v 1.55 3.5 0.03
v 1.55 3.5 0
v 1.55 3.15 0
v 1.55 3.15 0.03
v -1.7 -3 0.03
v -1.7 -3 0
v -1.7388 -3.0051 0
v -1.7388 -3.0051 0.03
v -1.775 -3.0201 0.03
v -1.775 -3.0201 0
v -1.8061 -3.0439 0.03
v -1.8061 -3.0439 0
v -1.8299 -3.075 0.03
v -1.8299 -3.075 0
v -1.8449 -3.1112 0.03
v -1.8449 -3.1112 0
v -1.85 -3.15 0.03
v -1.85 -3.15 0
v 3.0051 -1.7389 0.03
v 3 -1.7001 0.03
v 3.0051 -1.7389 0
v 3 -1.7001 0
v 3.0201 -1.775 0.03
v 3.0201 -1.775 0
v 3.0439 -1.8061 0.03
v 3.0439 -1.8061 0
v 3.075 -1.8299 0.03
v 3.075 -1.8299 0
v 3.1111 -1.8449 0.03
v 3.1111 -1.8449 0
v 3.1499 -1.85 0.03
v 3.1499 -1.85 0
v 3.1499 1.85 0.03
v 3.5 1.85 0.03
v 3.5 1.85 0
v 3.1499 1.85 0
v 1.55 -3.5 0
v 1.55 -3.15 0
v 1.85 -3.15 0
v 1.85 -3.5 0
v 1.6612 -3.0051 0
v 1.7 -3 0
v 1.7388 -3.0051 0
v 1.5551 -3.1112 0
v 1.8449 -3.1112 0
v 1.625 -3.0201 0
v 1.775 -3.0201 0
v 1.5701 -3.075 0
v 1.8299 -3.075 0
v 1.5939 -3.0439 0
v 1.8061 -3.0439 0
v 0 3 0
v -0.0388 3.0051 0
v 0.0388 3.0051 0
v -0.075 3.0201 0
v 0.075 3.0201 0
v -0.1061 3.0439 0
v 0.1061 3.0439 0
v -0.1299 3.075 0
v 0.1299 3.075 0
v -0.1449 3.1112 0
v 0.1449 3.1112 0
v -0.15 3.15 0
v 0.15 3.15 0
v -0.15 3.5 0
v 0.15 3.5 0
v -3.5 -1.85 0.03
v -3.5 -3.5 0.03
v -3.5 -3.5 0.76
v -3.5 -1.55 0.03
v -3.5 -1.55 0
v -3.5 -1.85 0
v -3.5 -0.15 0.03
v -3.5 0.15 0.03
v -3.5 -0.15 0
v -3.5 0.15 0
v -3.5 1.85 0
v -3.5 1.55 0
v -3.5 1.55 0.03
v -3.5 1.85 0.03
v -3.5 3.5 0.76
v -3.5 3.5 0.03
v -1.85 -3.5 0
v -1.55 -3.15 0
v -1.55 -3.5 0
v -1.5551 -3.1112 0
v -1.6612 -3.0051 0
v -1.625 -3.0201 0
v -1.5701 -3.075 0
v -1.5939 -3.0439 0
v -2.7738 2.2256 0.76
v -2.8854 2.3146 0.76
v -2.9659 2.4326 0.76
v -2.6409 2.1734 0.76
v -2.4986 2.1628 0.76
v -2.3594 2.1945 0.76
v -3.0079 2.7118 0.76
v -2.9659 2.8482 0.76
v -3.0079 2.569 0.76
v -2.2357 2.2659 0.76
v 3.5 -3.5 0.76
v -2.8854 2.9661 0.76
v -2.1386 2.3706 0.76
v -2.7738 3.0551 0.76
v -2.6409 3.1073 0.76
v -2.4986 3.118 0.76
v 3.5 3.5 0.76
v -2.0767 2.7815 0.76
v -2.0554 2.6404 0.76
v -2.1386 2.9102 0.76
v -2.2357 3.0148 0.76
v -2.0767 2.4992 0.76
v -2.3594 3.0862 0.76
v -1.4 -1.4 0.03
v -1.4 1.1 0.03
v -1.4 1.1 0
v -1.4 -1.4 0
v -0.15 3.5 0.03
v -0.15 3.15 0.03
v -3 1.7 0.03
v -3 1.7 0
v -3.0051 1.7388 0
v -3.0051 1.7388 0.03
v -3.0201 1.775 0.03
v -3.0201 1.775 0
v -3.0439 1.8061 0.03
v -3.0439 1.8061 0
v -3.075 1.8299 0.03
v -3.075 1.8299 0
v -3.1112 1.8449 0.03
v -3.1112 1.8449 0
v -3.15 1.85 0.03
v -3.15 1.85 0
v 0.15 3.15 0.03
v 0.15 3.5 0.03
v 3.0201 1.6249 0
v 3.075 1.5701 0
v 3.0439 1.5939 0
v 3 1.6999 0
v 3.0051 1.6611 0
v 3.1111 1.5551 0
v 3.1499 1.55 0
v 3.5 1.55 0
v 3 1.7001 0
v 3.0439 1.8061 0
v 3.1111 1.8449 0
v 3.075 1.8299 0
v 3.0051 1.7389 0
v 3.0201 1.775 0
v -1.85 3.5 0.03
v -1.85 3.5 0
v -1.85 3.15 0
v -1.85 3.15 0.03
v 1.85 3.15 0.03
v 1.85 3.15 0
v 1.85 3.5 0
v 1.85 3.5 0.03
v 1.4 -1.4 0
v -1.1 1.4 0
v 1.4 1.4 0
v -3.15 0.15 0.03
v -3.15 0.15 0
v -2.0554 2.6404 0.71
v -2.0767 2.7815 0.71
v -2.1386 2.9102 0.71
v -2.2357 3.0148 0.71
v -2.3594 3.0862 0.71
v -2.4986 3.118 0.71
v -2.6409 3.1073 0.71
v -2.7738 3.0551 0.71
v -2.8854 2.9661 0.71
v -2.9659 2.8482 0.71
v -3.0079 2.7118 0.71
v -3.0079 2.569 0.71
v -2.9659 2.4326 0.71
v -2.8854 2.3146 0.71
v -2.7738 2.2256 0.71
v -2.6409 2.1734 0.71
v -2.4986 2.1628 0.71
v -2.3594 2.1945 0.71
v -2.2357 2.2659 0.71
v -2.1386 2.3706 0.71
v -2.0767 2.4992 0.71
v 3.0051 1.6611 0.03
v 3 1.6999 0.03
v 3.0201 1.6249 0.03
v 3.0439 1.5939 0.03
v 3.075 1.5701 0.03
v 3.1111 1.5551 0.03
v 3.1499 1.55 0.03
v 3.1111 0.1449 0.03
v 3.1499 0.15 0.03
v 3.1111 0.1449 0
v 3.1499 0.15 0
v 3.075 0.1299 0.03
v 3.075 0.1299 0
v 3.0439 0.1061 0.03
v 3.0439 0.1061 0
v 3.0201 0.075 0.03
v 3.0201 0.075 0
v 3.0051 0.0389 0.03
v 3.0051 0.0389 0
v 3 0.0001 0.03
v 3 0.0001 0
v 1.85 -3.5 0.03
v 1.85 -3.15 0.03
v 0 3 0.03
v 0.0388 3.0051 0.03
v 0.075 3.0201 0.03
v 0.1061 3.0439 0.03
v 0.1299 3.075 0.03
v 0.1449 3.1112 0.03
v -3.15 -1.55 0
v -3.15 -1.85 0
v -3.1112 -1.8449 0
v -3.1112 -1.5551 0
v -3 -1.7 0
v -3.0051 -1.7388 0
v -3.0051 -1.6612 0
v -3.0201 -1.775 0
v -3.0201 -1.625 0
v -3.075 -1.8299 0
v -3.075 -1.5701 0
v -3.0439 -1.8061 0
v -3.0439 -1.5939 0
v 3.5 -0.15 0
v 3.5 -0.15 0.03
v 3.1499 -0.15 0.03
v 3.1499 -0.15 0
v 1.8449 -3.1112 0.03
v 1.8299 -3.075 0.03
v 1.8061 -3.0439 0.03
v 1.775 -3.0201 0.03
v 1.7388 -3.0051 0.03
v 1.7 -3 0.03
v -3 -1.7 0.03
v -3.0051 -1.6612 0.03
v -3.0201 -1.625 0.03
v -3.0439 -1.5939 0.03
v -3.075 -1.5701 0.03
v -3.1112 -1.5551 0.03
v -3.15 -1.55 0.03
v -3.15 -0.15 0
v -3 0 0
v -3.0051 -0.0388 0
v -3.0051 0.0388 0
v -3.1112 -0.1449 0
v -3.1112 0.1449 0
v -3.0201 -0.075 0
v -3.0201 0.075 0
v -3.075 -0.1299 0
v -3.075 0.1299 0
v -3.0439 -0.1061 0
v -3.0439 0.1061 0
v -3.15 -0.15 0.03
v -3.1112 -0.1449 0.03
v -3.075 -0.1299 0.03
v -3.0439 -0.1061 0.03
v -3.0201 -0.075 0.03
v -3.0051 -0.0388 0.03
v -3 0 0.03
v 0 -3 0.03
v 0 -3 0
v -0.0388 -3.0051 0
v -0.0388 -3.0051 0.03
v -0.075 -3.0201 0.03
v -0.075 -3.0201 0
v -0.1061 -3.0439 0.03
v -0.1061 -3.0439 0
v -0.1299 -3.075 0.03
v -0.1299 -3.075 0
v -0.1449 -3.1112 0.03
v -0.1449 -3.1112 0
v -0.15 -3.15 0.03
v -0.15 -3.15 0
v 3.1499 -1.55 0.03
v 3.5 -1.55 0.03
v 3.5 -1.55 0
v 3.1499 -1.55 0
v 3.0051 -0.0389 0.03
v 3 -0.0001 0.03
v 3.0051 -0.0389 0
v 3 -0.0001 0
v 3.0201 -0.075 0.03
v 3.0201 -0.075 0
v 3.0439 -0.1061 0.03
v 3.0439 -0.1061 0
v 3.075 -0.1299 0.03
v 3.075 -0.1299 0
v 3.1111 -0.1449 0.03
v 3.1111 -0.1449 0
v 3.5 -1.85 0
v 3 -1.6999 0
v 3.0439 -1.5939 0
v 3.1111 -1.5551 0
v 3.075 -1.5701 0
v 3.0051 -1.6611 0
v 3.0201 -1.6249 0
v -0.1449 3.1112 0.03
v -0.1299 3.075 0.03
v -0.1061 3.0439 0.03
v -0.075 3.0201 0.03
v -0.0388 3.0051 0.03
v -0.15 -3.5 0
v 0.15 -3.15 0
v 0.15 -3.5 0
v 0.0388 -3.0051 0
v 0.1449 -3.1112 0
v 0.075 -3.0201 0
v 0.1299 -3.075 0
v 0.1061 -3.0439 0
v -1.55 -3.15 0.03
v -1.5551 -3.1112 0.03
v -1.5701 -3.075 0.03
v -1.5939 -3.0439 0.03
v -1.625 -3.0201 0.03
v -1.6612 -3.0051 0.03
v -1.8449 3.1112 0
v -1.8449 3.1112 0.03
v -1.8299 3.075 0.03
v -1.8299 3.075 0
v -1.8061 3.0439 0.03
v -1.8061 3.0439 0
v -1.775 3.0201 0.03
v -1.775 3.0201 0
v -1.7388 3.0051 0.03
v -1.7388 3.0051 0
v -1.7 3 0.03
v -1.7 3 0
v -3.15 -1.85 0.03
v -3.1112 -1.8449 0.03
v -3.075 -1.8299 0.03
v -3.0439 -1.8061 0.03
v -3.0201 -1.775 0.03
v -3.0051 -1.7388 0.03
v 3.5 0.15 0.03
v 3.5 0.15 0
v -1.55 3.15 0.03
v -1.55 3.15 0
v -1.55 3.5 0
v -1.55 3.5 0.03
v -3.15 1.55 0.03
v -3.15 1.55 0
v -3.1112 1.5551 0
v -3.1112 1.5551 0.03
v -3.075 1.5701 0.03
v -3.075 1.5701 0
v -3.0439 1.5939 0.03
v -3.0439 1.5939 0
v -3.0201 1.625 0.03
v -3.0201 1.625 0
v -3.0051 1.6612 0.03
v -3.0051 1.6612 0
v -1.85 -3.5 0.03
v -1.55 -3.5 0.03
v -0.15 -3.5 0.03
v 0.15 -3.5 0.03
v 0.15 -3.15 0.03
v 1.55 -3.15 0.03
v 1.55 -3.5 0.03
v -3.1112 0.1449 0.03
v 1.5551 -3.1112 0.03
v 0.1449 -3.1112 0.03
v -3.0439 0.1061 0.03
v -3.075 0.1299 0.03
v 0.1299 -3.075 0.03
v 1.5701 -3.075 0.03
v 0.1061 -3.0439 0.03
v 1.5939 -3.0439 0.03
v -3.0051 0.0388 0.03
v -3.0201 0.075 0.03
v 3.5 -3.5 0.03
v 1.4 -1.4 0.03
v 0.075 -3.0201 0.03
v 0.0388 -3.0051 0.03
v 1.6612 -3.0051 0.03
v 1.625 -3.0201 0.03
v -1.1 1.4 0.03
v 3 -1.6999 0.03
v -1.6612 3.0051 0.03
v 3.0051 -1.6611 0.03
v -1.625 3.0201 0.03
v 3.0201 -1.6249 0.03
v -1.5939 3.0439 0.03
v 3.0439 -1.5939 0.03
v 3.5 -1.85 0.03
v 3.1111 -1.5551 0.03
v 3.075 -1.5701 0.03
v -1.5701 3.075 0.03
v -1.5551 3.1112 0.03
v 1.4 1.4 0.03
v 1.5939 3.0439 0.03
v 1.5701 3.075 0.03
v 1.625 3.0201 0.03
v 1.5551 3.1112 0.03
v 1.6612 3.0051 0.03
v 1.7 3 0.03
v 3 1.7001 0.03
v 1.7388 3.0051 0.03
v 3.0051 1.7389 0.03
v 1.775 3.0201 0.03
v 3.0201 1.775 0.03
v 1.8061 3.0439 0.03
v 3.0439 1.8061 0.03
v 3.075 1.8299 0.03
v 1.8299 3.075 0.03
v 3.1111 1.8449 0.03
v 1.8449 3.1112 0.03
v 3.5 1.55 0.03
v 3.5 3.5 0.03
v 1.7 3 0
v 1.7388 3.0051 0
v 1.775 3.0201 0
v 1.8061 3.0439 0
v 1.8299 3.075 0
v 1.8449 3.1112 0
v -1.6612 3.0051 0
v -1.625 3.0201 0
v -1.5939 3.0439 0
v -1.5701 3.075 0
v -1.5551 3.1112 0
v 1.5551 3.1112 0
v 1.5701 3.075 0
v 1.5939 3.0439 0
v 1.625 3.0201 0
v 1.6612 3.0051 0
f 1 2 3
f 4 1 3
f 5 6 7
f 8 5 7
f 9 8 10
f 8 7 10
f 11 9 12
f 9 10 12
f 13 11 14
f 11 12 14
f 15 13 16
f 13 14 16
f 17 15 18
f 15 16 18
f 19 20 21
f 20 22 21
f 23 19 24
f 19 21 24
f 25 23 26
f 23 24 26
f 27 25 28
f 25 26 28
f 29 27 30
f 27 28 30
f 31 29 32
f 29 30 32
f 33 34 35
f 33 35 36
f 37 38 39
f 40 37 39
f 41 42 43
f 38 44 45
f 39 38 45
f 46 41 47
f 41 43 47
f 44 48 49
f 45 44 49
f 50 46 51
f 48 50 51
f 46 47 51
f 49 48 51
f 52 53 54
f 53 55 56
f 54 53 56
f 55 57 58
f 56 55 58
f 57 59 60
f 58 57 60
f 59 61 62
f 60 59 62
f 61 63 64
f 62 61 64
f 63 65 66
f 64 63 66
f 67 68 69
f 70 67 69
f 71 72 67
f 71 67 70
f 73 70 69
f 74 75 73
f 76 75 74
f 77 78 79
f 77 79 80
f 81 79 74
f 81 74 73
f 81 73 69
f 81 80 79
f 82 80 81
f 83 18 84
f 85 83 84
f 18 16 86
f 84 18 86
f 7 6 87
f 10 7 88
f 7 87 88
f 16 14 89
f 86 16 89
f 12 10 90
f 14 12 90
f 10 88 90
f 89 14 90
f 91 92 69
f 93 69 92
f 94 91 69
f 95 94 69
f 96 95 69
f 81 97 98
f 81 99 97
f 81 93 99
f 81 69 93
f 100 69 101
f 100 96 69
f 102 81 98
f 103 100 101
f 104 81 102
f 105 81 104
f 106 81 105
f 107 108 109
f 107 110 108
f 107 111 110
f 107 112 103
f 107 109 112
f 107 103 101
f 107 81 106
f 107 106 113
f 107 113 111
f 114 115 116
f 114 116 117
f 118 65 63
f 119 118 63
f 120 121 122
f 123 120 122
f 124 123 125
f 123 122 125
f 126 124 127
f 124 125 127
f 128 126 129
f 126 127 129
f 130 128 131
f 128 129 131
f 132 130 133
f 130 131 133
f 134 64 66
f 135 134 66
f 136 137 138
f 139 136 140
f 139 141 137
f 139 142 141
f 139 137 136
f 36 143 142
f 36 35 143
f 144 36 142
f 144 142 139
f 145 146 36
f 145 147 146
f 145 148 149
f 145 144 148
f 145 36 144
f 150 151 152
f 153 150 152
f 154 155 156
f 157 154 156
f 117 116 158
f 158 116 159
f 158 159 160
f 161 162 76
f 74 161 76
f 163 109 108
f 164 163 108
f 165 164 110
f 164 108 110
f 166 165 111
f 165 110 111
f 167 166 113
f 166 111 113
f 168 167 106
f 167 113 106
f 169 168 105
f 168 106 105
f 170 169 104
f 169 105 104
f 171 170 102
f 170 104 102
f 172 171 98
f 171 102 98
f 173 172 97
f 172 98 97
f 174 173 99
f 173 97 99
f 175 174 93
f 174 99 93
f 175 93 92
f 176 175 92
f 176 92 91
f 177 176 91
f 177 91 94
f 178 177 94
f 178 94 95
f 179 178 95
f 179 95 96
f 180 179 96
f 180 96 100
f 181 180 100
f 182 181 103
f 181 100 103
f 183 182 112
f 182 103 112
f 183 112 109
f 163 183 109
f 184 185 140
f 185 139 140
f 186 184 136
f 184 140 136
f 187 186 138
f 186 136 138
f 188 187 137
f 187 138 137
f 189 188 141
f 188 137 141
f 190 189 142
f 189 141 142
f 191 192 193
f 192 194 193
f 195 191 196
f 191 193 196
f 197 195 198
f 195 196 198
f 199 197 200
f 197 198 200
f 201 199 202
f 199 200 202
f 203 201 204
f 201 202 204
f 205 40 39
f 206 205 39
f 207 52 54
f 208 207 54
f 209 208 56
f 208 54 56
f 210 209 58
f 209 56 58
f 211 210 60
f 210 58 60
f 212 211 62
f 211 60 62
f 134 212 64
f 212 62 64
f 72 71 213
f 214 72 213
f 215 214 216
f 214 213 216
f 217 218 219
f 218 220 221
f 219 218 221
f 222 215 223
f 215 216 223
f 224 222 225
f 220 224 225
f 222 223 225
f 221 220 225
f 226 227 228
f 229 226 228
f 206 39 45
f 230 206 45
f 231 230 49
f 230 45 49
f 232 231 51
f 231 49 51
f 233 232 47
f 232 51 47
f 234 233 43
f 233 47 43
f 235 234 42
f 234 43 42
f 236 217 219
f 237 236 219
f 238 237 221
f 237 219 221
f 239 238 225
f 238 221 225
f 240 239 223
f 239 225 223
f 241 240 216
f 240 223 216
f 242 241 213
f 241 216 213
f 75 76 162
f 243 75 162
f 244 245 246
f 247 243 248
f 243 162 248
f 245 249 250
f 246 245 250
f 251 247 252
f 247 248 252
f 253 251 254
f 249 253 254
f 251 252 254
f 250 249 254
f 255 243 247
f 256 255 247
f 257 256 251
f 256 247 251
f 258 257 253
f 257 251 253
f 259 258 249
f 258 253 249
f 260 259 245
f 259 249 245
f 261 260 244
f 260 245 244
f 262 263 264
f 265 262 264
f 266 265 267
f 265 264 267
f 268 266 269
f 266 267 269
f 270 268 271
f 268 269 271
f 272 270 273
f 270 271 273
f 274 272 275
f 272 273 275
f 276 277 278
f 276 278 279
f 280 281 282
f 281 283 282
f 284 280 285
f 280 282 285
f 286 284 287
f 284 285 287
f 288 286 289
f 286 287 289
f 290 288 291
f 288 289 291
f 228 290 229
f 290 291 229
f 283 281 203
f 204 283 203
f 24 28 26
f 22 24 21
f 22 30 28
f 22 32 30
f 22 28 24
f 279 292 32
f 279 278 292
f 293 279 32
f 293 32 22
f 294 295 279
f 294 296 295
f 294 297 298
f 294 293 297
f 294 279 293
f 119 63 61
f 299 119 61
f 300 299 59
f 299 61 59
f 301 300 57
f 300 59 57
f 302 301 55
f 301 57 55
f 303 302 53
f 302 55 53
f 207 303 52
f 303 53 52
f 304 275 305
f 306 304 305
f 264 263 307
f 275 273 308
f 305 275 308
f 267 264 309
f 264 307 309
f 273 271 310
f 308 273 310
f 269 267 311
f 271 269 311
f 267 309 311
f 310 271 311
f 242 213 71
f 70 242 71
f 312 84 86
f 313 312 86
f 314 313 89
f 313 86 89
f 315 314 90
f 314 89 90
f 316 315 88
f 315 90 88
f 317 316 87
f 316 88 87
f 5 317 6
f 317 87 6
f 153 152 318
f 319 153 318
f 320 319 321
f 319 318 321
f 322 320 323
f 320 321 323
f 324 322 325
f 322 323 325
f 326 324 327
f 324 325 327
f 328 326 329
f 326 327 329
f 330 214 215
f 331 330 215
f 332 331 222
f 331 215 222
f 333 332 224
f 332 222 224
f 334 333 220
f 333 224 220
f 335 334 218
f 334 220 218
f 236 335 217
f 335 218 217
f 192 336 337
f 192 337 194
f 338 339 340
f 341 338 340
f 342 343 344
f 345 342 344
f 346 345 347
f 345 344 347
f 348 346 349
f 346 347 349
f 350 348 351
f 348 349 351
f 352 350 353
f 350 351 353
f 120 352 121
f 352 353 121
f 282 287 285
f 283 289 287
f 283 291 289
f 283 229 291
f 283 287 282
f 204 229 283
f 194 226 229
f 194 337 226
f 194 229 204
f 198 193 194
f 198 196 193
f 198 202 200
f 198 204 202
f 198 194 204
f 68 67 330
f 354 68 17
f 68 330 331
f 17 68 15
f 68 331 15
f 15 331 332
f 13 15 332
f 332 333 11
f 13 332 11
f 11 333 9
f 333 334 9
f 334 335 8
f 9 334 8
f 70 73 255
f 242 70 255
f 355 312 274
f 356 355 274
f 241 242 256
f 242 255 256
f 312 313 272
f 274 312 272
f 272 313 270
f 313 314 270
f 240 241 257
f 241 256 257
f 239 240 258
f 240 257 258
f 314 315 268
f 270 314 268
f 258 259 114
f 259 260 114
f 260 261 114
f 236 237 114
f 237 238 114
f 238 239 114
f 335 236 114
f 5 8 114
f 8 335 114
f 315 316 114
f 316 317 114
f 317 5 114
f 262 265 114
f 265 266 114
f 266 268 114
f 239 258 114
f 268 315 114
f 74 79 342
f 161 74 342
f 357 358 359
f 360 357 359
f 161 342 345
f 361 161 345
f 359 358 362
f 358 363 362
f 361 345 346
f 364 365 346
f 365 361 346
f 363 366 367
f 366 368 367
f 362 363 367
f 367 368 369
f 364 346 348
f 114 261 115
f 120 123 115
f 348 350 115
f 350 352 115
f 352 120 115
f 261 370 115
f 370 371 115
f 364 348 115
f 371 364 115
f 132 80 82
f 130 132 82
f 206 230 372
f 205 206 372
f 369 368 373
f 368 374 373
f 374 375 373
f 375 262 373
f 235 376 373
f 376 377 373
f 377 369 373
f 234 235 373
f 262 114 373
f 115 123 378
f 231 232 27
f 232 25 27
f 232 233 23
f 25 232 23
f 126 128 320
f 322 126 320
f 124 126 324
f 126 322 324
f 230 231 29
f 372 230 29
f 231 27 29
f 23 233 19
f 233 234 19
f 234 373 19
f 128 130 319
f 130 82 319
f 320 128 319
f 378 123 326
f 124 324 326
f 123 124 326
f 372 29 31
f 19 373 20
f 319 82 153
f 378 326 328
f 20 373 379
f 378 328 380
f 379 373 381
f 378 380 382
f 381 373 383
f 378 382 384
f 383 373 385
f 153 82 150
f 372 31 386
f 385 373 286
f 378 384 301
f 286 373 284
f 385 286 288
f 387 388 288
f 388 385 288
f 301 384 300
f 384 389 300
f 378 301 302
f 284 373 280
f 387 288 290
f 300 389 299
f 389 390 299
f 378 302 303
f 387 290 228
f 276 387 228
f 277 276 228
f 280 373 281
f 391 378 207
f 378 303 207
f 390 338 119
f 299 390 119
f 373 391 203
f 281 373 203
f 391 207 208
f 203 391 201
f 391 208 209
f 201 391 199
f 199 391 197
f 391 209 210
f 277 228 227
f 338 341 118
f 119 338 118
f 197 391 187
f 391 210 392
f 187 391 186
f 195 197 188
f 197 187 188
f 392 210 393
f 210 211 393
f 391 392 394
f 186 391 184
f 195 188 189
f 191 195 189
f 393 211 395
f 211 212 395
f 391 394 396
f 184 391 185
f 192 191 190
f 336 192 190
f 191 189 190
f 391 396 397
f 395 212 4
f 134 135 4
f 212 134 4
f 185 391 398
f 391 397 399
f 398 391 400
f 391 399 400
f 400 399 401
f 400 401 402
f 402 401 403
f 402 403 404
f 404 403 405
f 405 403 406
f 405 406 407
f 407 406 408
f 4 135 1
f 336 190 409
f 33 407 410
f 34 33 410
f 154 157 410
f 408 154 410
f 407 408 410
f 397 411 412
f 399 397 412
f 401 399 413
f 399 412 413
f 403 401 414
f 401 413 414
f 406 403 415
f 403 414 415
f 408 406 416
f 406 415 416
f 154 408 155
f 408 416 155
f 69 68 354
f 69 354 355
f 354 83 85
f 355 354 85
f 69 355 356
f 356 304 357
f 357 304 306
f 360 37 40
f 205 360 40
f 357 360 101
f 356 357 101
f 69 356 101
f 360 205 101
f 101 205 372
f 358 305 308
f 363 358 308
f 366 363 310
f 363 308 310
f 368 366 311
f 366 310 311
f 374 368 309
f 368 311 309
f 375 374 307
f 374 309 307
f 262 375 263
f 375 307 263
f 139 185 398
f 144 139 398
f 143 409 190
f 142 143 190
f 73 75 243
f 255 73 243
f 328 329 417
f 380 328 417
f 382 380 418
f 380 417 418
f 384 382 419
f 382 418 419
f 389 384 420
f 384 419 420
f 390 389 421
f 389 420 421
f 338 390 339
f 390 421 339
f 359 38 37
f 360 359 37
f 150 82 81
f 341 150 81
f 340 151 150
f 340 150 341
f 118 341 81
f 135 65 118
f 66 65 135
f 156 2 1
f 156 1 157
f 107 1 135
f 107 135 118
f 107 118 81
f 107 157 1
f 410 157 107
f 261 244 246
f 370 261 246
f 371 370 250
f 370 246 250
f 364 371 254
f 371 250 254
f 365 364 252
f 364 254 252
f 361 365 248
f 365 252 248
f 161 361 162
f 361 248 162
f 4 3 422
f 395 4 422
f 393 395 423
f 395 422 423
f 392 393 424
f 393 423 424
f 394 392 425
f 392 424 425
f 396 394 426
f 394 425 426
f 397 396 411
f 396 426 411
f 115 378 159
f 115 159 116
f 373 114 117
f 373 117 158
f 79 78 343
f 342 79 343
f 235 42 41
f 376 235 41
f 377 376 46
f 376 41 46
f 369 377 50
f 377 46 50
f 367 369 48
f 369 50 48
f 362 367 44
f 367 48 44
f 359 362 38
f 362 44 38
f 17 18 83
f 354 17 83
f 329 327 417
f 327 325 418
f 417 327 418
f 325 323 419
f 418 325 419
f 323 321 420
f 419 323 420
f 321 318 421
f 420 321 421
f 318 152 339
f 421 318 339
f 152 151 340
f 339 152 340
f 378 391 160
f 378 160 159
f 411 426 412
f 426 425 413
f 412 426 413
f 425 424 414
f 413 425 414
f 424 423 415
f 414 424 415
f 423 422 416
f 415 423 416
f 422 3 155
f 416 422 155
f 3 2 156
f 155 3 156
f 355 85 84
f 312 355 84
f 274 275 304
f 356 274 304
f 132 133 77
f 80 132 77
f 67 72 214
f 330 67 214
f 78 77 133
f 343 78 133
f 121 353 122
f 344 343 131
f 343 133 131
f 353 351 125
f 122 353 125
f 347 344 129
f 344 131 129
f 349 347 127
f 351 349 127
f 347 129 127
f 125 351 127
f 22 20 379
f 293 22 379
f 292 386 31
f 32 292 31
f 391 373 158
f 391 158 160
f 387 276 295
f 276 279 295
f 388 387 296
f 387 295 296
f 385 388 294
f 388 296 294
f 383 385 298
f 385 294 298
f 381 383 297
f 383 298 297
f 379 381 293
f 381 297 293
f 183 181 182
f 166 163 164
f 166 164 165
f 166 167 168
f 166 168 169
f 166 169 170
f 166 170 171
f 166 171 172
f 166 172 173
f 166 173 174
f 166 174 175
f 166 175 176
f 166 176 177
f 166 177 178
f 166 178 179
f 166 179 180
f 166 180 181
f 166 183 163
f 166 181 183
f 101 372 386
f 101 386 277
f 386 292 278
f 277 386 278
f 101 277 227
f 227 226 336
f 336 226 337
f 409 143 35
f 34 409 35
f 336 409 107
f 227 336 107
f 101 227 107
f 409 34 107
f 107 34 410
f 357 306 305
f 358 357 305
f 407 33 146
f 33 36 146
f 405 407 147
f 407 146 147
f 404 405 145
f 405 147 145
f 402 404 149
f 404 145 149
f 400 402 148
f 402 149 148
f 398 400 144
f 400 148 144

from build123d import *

# Parameters (mm, degrees)
BOSS_EXTRUDE1_START    = 0.03
SKETCH1_W              = 7
SKETCH1_H              = 7
BOSS_EXTRUDE1_DEPTH    = 0.73
SKETCH2_R              = 0.478943658
CUT_EXTRUDE1_DEPTH     = 0.05
BOSS_EXTRUDE2_DEPTH    = 0.03
SKETCH4_W              = 0.5
SKETCH4_H              = 0.3
BOSS_EXTRUDE3_DEPTH    = 0.03
FILLET1_R              = 0.15
LPATTERN1_COUNT        = 3
LPATTERN1_PITCH        = 1.7
FILLET1_OF_LPATTERN1_R = 0.15
CIRPATTERN1_DEPTH      = 0.03


# Read off the part's stored shape, not the designer's step: CirPattern1
with BuildPart() as part:
    # Sketch1 → Boss-Extrude1 (new body)
    with BuildSketch(Plane.XY.offset(BOSS_EXTRUDE1_START)):
        Rectangle(SKETCH1_W, SKETCH1_H)
    extrude(amount=BOSS_EXTRUDE1_DEPTH)

    # Sketch2 → Cut-Extrude1 (cut)
    with BuildSketch(Plane.XY.offset(0.76)):
        with Locations((-2.534351737, 2.640370435)):
            Circle(SKETCH2_R)
    extrude(amount=-CUT_EXTRUDE1_DEPTH, mode=Mode.SUBTRACT)

    # Sketch3 → Boss-Extrude2 (add)
    with BuildSketch(Plane(origin=(0, 0, 0.03), x_dir=(-1, 0, 0), z_dir=(0, 0, -1))):
        Polygon((1.1, 1.4), (1.4, 1.1), (1.4, -1.4), (-1.4, -1.4), (-1.4, 1.4), align=None)
    extrude(amount=BOSS_EXTRUDE2_DEPTH)

    # Sketch4 → Boss-Extrude3 (add)
    with BuildSketch(Plane(origin=(0, 0, 0.03), x_dir=(-1, 0, 0), z_dir=(0, 0, -1))):
        with Locations((-3.25, 1.7)):
            Rectangle(SKETCH4_W, SKETCH4_H)
    boss_extrude3 = extrude(amount=BOSS_EXTRUDE3_DEPTH)

    # Fillet1
    fillet1_edges = [part.edges().sort_by_distance(p)[0] for p in [
        (3, 1.85, 0.015),
        (3, 1.55, 0.015),
    ]]
    fillet(fillet1_edges, radius=FILLET1_R - 0.0001)  # a hair under: the kernel refuses the full size

    # LPattern1: Boss-Extrude3 ×3
    with Locations(*[(0, -i * LPATTERN1_PITCH, 0) for i in range(1, LPATTERN1_COUNT)]):
        add(boss_extrude3)

    # Fillet1 of LPattern1
    fillet1_of_lpattern1_edges = [part.edges().sort_by_distance(p)[0] for p in [
        (3, 0.15, 0.015),
        (3, -0.15, 0.015),
        (3, -1.55, 0.015),
        (3, -1.85, 0.015),
    ]]
    fillet(fillet1_of_lpattern1_edges, radius=FILLET1_OF_LPATTERN1_R - 0.0001)  # a hair under: the kernel refuses the full size

    # CirPattern1 outline → CirPattern1 (add)
    with BuildSketch(Plane.XY):
        with BuildLine():
            Line((-3.5, 1.85), (-3.5, 1.55))
            Line((-3.5, 1.55), (-3.15, 1.55))
            ThreePointArc((-3.15, 1.55), (-3.043933983, 1.593933983), (-3, 1.7))
            ThreePointArc((-3, 1.7), (-3.043933983, 1.806066017), (-3.15, 1.85))
            Line((-3.15, 1.85), (-3.5, 1.85))
        make_face()
        with BuildLine():
            Line((1.55, -3.15), (1.55, -3.5))
            Line((1.55, -3.5), (1.85, -3.5))
            Line((1.85, -3.5), (1.85, -3.15))
            ThreePointArc((1.85, -3.15), (1.806066017, -3.043933983), (1.7, -3))
            ThreePointArc((1.7, -3), (1.593933983, -3.043933983), (1.55, -3.15))
        make_face()
        with BuildLine():
            Line((-0.15, -3.15), (-0.15, -3.5))
            Line((-0.15, -3.5), (0.15, -3.5))
            Line((0.15, -3.5), (0.15, -3.15))
            ThreePointArc((0.15, -3.15), (0.106066017, -3.043933983), (0, -3))
            ThreePointArc((0, -3), (-0.106066017, -3.043933983), (-0.15, -3.15))
        make_face()
        with BuildLine():
            Line((-1.85, -3.15), (-1.85, -3.5))
            Line((-1.85, -3.5), (-1.55, -3.5))
            Line((-1.55, -3.5), (-1.55, -3.15))
            ThreePointArc((-1.55, -3.15), (-1.593933983, -3.043933983), (-1.7, -3))
            ThreePointArc((-1.7, -3), (-1.806066017, -3.043933983), (-1.85, -3.15))
        make_face()
        with BuildLine():
            Line((-3.15, -1.55), (-3.5, -1.55))
            Line((-3.5, -1.55), (-3.5, -1.85))
            Line((-3.5, -1.85), (-3.15, -1.85))
            ThreePointArc((-3.15, -1.85), (-3.043933983, -1.806066017), (-3, -1.7))
            ThreePointArc((-3, -1.7), (-3.043933983, -1.593933983), (-3.15, -1.55))
        make_face()
        with BuildLine():
            Line((-3.15, 0.15), (-3.5, 0.15))
            Line((-3.5, 0.15), (-3.5, -0.15))
            Line((-3.5, -0.15), (-3.15, -0.15))
            ThreePointArc((-3.15, -0.15), (-3.043933983, -0.106066017), (-3, 0))
            ThreePointArc((-3, 0), (-3.043933983, 0.106066017), (-3.15, 0.15))
        make_face()
        with BuildLine():
            Line((1.85, 3.5), (1.55, 3.5))
            Line((1.55, 3.5), (1.55, 3.15))
            ThreePointArc((1.55, 3.15), (1.593933983, 3.043933983), (1.7, 3))
            ThreePointArc((1.7, 3), (1.806066017, 3.043933983), (1.85, 3.15))
            Line((1.85, 3.15), (1.85, 3.5))
        make_face()
        with BuildLine():
            Line((0.15, 3.5), (-0.15, 3.5))
            Line((-0.15, 3.5), (-0.15, 3.15))
            ThreePointArc((-0.15, 3.15), (-0.106066017, 3.043933983), (0, 3))
            ThreePointArc((0, 3), (0.106066017, 3.043933983), (0.15, 3.15))
            Line((0.15, 3.15), (0.15, 3.5))
        make_face()
        with BuildLine():
            Line((-1.55, 3.5), (-1.85, 3.5))
            Line((-1.85, 3.5), (-1.85, 3.15))
            ThreePointArc((-1.85, 3.15), (-1.806066017, 3.043933983), (-1.7, 3))
            ThreePointArc((-1.7, 3), (-1.593933983, 3.043933983), (-1.55, 3.15))
            Line((-1.55, 3.15), (-1.55, 3.5))
        make_face()
    extrude(amount=CIRPATTERN1_DEPTH)


solid = part.part
